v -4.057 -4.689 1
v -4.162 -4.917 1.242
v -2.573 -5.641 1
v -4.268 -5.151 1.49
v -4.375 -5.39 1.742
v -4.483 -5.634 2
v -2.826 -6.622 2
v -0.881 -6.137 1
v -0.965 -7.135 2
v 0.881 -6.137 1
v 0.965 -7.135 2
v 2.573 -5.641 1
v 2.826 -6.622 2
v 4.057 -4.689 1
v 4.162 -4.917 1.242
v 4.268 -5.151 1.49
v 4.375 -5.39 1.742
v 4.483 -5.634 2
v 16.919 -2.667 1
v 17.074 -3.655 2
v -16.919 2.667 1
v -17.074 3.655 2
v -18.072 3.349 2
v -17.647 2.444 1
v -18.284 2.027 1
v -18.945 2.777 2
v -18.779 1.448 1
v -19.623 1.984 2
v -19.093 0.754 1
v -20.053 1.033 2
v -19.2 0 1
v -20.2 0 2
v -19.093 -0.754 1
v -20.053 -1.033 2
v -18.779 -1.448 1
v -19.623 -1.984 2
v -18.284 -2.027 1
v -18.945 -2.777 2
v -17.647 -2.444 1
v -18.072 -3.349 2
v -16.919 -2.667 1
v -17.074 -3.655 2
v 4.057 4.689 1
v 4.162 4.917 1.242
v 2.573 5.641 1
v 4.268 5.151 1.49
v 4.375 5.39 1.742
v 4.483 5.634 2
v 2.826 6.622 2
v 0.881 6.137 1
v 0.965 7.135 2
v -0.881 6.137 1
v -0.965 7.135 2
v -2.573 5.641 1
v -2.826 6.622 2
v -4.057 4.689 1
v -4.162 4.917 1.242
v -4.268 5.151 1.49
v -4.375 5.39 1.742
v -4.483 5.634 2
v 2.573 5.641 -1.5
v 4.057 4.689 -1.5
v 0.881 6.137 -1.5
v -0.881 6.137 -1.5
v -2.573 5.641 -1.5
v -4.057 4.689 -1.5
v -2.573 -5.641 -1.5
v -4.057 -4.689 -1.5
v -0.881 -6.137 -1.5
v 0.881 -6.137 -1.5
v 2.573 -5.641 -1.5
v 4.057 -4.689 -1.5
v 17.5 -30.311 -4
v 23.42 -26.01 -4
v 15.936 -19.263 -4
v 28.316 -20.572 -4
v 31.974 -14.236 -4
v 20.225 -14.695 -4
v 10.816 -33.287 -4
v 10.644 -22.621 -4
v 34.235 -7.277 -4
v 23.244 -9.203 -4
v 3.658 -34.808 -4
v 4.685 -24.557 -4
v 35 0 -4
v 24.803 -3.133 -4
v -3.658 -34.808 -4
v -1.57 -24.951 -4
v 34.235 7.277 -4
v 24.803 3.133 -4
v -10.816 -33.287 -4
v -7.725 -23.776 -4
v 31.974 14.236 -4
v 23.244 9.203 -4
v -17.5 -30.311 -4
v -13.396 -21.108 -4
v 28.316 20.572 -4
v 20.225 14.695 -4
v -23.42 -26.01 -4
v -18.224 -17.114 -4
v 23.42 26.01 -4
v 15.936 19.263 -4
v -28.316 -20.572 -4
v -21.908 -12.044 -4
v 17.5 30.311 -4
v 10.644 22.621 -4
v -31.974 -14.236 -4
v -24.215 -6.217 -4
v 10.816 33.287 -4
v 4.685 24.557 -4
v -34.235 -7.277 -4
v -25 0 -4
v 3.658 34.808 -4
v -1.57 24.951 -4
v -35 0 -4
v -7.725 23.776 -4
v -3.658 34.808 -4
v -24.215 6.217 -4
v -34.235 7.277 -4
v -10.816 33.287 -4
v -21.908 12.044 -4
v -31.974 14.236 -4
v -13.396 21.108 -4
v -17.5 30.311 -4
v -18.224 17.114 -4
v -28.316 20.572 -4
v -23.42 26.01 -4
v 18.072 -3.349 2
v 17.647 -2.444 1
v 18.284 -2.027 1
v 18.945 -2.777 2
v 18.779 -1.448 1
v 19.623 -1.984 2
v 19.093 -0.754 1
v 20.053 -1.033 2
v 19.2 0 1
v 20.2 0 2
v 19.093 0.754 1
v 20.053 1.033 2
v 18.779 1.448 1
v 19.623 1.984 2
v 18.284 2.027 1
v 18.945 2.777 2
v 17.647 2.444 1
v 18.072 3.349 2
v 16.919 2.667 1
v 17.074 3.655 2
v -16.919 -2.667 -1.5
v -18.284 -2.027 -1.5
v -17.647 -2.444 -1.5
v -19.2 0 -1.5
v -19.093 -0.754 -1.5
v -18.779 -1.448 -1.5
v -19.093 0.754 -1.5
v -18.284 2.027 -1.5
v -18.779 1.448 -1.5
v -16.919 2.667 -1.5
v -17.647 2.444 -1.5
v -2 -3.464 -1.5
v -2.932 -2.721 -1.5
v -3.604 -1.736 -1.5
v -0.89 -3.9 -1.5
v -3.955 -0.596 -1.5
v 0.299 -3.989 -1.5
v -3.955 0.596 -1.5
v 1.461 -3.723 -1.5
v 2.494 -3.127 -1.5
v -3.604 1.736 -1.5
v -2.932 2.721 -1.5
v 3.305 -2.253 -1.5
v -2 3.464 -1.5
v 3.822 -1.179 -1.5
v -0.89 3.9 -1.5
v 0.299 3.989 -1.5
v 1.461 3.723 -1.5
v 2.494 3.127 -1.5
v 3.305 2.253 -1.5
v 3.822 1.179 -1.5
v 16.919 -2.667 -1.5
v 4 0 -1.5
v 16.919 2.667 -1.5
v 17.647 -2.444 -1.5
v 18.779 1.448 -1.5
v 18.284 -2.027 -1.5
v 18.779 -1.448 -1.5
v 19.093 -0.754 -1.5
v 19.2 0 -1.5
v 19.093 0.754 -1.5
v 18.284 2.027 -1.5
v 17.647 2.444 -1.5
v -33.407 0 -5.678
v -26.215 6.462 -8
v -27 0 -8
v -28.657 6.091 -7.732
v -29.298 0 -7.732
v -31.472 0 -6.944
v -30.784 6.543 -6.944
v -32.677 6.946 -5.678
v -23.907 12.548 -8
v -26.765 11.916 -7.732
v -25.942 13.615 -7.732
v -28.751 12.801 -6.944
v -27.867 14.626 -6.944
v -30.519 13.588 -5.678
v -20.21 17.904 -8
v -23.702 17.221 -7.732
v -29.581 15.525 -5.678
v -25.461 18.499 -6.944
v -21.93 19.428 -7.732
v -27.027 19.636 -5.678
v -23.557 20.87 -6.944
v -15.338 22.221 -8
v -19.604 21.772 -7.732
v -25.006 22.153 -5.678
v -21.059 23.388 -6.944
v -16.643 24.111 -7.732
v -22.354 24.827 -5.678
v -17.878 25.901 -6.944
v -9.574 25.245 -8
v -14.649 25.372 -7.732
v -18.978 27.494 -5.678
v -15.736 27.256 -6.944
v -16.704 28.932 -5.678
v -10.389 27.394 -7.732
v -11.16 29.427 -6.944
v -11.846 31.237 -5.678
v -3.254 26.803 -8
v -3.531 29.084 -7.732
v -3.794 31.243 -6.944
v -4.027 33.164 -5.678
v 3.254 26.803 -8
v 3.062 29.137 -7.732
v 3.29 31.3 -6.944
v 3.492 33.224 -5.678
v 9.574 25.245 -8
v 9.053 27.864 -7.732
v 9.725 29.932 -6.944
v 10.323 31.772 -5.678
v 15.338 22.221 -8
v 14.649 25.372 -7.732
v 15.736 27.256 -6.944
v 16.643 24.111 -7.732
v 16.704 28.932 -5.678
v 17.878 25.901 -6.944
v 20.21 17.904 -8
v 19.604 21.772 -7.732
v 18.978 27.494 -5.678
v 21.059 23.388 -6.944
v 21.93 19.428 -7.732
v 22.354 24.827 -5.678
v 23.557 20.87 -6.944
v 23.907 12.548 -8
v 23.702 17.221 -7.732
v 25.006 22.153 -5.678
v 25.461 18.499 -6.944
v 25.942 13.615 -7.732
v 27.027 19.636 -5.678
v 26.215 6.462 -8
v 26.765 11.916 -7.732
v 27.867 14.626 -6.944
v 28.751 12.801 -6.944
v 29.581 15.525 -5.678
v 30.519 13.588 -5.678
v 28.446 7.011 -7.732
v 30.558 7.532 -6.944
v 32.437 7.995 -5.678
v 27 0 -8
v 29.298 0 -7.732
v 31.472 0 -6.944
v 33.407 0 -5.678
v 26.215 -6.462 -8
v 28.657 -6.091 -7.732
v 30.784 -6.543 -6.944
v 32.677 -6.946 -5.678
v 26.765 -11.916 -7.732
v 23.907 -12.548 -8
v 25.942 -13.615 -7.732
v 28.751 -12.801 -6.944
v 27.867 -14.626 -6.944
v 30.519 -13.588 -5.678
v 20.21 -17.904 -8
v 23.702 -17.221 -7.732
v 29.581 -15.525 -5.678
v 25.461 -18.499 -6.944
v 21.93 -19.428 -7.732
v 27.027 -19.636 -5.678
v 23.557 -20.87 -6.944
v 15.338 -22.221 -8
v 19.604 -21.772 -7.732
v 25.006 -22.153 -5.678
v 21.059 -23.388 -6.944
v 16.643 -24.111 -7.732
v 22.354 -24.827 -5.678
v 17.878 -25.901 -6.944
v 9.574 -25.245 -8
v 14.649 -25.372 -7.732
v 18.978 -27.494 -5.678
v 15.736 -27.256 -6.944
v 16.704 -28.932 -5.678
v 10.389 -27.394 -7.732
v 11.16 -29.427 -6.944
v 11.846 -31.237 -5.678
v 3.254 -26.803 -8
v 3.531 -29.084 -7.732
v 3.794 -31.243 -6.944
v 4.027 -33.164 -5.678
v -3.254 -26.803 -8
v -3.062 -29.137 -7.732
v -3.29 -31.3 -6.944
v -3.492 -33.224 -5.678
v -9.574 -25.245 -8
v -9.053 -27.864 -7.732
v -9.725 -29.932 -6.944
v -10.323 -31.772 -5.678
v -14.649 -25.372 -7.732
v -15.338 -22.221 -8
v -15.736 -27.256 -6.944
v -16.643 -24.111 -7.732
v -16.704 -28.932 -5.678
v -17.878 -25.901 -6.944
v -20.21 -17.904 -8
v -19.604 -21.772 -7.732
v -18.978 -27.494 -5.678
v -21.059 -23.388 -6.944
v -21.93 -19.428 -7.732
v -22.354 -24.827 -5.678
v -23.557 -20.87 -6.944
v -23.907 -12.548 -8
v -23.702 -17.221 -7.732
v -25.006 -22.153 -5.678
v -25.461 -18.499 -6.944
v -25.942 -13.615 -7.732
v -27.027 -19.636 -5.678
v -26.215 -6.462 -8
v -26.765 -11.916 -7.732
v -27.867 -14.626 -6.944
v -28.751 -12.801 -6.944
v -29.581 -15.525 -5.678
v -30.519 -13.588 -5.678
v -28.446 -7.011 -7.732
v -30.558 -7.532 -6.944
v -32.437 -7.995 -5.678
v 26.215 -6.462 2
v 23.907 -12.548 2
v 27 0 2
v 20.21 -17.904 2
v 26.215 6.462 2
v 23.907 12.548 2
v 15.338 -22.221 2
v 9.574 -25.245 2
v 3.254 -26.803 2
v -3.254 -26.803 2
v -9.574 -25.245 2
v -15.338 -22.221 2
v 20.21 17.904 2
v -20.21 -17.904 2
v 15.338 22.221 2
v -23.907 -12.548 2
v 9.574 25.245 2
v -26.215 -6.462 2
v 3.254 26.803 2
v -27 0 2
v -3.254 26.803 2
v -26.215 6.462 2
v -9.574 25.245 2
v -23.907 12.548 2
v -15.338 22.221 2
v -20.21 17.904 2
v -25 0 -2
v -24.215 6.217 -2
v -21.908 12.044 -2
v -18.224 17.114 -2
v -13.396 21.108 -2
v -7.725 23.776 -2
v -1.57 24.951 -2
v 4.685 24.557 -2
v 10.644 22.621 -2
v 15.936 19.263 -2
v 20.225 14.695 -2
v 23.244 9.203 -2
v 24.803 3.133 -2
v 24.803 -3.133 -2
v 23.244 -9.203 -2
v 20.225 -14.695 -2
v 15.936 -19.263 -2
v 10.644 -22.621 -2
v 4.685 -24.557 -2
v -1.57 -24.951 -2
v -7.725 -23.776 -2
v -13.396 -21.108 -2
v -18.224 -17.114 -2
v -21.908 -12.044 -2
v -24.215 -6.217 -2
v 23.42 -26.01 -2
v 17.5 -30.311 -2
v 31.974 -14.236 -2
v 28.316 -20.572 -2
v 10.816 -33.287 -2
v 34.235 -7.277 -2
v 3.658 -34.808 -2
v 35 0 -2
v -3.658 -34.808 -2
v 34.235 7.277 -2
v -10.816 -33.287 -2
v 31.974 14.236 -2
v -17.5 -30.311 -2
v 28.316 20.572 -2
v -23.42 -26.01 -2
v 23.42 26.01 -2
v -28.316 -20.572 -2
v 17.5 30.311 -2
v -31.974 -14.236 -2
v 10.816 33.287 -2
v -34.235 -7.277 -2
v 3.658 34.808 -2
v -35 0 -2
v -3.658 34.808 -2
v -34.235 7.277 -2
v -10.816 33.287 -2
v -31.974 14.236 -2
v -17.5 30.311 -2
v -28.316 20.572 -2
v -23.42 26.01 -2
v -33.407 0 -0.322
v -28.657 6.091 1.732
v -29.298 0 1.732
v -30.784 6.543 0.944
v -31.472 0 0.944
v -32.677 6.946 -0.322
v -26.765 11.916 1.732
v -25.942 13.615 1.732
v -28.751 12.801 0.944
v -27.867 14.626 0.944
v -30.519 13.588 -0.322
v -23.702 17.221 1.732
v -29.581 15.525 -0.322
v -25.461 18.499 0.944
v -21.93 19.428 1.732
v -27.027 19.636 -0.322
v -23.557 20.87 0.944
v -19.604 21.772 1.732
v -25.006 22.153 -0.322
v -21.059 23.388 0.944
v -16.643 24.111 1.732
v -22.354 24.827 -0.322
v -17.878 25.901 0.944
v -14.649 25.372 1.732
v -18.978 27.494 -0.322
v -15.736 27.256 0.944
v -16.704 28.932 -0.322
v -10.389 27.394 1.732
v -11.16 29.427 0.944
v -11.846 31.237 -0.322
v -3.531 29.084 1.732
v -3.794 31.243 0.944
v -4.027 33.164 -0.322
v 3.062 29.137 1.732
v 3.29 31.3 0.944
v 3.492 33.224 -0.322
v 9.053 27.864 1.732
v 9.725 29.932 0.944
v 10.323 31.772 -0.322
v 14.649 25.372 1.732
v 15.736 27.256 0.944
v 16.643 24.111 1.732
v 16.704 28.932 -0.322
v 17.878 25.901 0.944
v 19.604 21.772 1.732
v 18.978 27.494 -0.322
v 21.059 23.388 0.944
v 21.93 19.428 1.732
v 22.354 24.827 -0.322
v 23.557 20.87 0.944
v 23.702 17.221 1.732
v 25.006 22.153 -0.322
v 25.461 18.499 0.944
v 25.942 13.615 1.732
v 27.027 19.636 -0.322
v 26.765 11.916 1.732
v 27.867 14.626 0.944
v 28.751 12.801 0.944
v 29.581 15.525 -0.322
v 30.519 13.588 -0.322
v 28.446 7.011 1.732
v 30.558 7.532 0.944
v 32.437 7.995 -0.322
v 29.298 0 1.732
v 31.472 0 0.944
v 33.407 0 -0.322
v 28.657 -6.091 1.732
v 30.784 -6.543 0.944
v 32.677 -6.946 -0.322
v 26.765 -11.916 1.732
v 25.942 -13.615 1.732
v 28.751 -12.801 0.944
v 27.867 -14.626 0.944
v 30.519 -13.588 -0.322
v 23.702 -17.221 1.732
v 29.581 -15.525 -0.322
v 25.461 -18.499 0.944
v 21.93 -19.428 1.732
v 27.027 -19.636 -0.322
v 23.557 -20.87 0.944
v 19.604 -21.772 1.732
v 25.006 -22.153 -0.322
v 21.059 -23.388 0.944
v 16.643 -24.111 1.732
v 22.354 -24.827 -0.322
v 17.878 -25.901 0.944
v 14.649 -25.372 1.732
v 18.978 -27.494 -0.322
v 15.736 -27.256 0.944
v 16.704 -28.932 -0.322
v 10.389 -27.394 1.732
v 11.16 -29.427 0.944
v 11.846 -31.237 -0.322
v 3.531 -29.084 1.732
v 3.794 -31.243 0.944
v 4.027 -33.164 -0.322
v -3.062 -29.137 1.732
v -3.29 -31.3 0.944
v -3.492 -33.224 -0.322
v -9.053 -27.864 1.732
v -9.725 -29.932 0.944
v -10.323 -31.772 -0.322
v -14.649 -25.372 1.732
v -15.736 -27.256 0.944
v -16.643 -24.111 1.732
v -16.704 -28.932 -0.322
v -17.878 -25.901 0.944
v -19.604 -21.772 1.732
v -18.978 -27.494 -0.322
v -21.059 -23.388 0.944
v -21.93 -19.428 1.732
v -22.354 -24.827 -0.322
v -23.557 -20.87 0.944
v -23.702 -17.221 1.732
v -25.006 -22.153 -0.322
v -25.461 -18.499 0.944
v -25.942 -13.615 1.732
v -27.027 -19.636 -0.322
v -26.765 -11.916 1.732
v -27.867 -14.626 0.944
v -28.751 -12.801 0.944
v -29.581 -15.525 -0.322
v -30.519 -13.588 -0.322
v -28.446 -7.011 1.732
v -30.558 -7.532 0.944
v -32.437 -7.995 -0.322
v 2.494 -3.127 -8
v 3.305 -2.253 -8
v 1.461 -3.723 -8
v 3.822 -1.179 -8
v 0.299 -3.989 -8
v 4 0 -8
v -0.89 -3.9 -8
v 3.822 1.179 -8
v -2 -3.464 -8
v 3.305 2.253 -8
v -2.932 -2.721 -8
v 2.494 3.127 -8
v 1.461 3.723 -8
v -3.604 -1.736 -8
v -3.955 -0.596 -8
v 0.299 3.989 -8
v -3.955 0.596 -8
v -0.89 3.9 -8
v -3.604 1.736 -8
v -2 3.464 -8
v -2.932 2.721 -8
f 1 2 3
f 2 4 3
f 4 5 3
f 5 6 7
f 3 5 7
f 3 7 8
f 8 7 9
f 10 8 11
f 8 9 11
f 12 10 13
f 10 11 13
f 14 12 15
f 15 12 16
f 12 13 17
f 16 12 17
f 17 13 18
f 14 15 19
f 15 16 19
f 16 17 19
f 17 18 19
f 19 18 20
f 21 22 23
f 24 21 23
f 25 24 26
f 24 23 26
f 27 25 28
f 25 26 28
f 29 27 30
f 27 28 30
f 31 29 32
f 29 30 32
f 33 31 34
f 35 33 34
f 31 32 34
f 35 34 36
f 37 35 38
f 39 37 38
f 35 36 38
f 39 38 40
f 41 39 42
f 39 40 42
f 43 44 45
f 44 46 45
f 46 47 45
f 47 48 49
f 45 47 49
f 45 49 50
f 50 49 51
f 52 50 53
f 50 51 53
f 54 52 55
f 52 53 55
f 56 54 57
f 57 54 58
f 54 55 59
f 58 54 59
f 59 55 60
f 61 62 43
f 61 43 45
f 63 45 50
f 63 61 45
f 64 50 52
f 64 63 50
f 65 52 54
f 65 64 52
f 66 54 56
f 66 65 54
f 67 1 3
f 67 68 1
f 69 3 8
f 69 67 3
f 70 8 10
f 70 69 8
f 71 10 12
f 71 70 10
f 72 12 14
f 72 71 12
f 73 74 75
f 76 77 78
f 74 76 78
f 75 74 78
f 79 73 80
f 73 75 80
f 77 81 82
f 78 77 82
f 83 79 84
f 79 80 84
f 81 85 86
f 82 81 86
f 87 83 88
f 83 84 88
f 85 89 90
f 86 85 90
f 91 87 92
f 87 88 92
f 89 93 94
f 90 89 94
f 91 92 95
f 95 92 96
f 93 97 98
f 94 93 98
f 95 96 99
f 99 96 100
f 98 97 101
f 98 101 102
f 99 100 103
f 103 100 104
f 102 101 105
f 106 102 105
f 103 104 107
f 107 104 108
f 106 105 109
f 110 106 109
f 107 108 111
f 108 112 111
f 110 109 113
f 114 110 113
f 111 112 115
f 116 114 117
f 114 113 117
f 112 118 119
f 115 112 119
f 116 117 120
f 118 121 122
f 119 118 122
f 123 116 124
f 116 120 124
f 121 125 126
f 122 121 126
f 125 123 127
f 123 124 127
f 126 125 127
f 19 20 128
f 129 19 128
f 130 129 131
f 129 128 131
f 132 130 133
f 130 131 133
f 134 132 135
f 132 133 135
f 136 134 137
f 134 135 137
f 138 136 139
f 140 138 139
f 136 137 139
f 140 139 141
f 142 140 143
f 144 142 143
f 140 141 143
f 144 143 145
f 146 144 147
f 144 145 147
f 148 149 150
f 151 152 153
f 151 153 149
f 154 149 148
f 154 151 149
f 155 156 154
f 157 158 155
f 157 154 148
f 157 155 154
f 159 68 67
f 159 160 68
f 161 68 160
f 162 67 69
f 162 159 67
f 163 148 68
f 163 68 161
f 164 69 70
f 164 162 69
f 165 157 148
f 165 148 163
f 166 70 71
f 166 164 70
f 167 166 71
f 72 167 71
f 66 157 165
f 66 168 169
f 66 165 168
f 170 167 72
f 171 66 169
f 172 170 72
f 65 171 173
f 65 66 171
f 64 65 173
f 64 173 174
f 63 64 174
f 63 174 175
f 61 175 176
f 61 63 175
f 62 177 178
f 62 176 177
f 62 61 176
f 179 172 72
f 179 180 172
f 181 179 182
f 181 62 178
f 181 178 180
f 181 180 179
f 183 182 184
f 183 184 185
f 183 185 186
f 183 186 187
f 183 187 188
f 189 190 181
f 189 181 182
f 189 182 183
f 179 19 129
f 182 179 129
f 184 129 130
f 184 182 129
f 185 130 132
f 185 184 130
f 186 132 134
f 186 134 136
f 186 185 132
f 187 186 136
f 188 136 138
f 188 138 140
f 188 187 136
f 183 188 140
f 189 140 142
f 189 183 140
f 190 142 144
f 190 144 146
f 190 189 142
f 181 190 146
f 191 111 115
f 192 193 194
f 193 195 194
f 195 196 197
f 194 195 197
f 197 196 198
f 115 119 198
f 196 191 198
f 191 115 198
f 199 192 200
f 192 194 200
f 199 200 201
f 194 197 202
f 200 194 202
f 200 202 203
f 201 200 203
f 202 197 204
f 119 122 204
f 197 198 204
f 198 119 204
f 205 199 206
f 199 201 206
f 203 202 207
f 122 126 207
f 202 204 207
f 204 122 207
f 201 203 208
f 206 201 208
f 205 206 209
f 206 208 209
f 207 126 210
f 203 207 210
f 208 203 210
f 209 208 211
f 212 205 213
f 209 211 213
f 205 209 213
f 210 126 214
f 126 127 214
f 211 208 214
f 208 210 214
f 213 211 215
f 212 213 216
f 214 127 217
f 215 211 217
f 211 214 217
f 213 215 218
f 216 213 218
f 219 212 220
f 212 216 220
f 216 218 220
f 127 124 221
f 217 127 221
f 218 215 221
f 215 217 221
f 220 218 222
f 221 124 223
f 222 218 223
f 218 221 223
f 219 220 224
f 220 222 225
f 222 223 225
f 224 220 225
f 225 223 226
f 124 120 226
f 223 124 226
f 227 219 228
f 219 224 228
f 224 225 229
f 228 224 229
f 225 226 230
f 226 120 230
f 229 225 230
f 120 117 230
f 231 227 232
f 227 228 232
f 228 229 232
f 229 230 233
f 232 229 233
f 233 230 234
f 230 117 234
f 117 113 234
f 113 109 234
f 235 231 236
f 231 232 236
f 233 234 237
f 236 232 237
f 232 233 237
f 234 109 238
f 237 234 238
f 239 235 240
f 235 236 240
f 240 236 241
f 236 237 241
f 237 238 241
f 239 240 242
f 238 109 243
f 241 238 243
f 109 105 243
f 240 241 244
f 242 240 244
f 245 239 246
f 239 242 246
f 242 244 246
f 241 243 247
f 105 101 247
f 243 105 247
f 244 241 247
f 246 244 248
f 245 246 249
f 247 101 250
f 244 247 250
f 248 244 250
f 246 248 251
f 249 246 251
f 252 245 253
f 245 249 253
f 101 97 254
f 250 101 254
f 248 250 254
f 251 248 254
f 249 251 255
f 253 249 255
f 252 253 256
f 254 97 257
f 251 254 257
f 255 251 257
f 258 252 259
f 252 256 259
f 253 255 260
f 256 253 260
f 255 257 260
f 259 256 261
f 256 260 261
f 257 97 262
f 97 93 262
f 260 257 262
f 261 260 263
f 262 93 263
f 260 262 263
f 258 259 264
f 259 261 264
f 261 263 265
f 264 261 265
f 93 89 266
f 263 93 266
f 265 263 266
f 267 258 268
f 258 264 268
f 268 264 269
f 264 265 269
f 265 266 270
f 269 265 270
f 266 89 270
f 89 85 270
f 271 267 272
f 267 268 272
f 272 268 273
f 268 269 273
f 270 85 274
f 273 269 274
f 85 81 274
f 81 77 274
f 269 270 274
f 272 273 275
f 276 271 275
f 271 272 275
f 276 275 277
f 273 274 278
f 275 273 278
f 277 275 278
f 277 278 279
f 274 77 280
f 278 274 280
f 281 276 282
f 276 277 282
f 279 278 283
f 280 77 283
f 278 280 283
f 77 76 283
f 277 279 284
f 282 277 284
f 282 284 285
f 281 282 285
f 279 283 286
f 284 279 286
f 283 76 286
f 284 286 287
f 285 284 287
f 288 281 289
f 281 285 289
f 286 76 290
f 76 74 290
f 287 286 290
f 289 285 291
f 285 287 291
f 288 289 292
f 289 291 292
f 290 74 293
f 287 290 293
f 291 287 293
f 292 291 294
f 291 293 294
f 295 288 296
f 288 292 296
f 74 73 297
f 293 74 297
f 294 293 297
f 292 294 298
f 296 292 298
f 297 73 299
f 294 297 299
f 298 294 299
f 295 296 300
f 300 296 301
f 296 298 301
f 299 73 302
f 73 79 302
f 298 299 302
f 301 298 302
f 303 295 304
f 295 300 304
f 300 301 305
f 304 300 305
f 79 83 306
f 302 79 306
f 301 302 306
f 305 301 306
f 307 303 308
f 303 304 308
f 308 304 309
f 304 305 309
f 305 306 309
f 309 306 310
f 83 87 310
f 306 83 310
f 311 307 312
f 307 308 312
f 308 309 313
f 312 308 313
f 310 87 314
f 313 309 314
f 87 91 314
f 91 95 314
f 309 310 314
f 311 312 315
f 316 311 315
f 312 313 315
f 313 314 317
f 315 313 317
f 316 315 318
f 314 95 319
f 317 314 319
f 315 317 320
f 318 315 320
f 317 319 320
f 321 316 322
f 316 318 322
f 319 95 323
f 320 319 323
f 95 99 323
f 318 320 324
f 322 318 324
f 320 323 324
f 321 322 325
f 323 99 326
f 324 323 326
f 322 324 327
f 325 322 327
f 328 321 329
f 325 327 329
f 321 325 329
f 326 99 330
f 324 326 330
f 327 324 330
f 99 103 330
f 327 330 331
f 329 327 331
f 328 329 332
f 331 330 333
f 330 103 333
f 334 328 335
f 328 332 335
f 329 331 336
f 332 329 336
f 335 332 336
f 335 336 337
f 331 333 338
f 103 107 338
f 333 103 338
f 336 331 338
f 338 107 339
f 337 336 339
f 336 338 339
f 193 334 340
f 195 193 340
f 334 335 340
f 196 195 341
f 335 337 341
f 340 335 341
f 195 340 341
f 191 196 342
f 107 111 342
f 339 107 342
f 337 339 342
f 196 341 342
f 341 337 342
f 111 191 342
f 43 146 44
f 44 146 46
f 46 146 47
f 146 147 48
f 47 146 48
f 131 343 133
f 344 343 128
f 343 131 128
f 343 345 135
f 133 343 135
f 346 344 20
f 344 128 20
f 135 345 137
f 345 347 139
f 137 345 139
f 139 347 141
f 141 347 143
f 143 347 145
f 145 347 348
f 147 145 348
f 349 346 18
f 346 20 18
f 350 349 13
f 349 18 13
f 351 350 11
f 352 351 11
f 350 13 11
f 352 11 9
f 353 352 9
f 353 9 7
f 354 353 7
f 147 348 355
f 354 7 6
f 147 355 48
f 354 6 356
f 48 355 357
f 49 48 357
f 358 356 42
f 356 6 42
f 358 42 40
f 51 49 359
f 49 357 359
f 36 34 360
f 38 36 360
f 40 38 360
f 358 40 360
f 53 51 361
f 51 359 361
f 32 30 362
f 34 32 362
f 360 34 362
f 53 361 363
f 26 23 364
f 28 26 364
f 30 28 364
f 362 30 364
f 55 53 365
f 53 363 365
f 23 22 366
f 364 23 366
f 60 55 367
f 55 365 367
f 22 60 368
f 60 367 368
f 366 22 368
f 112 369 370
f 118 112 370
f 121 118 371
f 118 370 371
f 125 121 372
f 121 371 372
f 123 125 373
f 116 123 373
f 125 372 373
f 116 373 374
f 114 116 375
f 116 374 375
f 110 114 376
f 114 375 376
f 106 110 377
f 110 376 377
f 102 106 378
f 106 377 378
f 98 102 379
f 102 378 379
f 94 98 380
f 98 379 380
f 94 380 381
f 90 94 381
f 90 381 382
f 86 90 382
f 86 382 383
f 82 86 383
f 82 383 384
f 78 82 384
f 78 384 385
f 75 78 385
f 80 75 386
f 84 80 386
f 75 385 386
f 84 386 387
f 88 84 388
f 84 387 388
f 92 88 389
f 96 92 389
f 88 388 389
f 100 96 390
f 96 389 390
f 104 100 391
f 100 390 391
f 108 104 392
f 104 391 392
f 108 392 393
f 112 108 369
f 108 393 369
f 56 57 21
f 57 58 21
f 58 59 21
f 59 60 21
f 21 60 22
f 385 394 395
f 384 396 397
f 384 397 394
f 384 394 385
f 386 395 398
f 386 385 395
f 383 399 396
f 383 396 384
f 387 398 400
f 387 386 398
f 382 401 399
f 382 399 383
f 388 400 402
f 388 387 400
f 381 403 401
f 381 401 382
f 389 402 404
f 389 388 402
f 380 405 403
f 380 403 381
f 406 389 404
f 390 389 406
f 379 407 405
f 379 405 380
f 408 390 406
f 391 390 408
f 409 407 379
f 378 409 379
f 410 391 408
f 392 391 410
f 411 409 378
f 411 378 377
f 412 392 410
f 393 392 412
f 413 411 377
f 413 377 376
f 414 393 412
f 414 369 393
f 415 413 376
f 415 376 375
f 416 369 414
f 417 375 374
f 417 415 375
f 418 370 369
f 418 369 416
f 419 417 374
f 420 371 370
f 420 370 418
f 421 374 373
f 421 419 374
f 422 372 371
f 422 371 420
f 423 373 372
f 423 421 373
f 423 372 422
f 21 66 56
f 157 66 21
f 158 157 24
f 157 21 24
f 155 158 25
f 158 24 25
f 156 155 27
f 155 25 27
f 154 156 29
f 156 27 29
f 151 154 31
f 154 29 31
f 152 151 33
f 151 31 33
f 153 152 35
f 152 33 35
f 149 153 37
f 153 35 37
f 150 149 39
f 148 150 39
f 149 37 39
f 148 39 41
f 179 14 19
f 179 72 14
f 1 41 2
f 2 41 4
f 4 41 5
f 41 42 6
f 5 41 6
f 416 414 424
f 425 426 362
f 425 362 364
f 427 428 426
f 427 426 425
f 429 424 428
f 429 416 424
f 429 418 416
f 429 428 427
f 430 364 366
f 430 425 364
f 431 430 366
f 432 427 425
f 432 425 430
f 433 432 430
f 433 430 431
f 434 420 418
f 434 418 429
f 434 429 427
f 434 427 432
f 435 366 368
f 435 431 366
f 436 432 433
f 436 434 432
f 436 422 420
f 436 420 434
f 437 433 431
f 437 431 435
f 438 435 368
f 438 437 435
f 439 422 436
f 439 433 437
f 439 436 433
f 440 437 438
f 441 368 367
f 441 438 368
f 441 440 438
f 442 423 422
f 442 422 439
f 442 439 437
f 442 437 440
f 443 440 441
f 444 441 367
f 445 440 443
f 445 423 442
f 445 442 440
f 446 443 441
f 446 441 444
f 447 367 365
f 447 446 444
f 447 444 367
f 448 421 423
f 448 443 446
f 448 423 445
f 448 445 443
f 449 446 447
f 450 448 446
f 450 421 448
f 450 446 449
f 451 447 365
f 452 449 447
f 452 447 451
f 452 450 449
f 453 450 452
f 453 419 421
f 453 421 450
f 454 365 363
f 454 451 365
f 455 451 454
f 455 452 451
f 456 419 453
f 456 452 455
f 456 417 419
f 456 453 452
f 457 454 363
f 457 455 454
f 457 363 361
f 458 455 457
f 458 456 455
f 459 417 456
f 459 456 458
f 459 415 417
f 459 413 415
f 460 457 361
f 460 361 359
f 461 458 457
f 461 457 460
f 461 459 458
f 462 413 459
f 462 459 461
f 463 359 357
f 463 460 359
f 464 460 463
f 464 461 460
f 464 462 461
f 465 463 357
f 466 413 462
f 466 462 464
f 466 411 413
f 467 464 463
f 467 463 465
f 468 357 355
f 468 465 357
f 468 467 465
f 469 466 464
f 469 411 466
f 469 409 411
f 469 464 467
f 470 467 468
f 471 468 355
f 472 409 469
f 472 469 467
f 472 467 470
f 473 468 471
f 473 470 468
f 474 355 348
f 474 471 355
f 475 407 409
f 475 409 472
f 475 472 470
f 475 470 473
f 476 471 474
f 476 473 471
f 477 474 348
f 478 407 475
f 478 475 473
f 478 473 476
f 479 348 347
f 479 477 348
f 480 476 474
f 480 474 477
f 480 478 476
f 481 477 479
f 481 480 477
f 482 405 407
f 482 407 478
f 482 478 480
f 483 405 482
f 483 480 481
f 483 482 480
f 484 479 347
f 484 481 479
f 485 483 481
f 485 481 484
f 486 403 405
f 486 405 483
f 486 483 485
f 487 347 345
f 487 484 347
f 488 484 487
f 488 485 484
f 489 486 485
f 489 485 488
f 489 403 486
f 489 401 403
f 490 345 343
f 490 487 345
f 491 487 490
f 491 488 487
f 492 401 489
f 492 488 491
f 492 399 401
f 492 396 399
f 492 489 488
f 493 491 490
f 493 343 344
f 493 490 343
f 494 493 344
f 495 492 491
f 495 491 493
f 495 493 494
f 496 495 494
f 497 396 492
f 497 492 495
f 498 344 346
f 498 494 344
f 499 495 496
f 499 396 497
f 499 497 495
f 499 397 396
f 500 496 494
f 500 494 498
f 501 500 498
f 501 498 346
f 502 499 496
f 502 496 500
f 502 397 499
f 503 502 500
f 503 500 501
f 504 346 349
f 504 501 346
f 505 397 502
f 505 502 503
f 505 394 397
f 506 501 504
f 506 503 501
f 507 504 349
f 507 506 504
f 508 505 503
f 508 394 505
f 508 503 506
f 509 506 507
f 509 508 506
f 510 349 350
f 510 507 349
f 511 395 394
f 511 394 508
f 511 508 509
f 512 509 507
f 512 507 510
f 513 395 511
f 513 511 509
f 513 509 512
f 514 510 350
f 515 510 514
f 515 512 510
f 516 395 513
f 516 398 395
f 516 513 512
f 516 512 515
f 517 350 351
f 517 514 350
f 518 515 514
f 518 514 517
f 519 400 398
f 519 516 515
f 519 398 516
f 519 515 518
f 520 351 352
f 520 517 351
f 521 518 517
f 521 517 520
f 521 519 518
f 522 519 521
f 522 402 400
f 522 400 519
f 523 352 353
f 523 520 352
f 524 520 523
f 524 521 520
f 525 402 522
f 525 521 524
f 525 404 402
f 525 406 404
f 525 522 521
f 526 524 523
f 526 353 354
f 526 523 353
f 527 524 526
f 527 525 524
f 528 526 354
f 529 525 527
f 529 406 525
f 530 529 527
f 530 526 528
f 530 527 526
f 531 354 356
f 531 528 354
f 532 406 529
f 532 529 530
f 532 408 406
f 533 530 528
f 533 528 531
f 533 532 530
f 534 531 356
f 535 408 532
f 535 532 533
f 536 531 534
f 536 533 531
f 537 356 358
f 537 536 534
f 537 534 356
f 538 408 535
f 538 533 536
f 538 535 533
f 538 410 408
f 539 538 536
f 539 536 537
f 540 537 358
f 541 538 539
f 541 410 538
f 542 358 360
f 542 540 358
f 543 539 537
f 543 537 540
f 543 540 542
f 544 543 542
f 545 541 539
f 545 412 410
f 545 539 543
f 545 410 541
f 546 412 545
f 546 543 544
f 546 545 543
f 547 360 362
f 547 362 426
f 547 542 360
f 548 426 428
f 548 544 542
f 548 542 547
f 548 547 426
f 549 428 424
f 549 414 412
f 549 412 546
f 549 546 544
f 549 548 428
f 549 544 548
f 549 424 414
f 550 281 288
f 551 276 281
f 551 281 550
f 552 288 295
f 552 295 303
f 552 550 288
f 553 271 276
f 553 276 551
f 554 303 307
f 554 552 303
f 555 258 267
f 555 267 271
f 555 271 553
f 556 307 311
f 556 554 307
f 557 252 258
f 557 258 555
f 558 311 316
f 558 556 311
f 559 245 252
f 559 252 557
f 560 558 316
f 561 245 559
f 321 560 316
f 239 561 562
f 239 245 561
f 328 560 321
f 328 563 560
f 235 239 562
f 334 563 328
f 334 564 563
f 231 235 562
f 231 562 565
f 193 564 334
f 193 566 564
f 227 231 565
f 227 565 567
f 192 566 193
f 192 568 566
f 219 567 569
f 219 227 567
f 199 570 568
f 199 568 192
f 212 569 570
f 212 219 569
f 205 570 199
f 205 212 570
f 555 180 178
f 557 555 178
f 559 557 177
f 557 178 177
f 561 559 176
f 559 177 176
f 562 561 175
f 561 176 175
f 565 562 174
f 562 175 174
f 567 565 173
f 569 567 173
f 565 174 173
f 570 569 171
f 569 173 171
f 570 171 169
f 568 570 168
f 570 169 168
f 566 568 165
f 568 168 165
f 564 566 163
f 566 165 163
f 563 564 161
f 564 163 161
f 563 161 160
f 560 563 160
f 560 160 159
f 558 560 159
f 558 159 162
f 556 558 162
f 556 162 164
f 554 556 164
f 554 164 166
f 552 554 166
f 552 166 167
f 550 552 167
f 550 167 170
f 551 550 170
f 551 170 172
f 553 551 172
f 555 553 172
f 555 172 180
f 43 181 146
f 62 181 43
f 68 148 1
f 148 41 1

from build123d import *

# Parameters (mm, degrees)
SKETCH_1_R               = 1.5
EXTRUDE_1_DEPTH          = 2.3
SKETCH_2_R               = 4.4
EXTRUDE_2_DEPTH          = 3.2
SKETCH_3_R               = 4.4
SKETCH_3_R_2             = 3.4
SKETCH_3_R_3             = 2.75
SKETCH_3_R_4             = 1.5
CUT_EXTRUDE_1_DEPTH      = 1
BOSS_EXTRUDE1_DEPTH      = 2
BOSS_EXTRUDE1_DEPTH_BACK = 2
SKETCH1_R                = 35
INTERSECT2_OUTLINE_R     = 4.4
INTERSECT2_OUTLINE_R_2   = 3.4
INTERSECT2_OUTLINE_R_3   = 2.75
INTERSECT2_DEPTH         = 5.5
INTERSECT2_START         = 1
INTERSECT2_2_OUTLINE_R   = 4.4
INTERSECT2_2_OUTLINE_R_2 = 3.4
INTERSECT2_2_OUTLINE_R_3 = 2.75
INTERSECT2_2_OUTLINE_R_4 = 1.5
INTERSECT2_2_DEPTH       = 4.5
FILLET1_R                = 10
SKETCH2_R                = 25
BOSS_EXTRUDE2_DEPTH      = 2
SKETCH3_R                = 27
BOSS_EXTRUDE3_DEPTH      = 2
SKETCH4_R                = 6
CUT_EXTRUDE1_DEPTH       = 2
CUT_EXTRUDE3_REACH       = 52.14
SKETCH5_R                = 4
CUT_EXTRUDE4_START       = -2
CUT_EXTRUDE4_DEPTH       = 2
CHAMFER1_SIZE            = 1
CUT_EXTRUDE5_DEPTH       = 1.5


# Read off the part's stored shape, not the designer's step: Intersect2
with BuildPart() as part:
    # Эскиз1 → Бобышка-Вытянуть1 (new body)
    with BuildSketch(Plane.XY):
        with BuildLine():
            Line((-3.968626967, 4.5), (-16.888114198, 2.469689731))
            ThreePointArc((-16.888114198, 2.469689731), (-19, 0), (-16.888114198, -2.469689731))
            Line((-16.888114198, -2.469689731), (-3.968626967, -4.5))
            ThreePointArc((-3.968626967, -4.5), (0, -6), (3.968626967, -4.5))
            Line((3.968626967, -4.5), (16.888114198, -2.469689731))
            ThreePointArc((16.888114198, -2.469689731), (19, 0), (16.888114198, 2.469689731))
            Line((16.888114198, 2.469689731), (3.968626967, 4.5))
            ThreePointArc((3.968626967, 4.5), (0, 6), (-3.968626967, 4.5))
        make_face()
        Circle(SKETCH_1_R, mode=Mode.SUBTRACT)
    extrude(amount=EXTRUDE_1_DEPTH)

    # Эскиз2 → Бобышка-Вытянуть2 (add)
    with BuildSketch(Plane.XY.offset(2.3)):
        with Locations(Location((0, 0, 0), (0, 0, 180))):
            Circle(SKETCH_2_R)
        Polygon((0.333439775, 2.639447604), (0, 3.05), (-0.333439775, 2.639447604), (-0.758504156, 2.954178641), (-0.979368078, 2.473601404), (-1.469348706, 2.672735374), (-1.563759083, 2.15232973), (-2.087868673, 2.223354314), (-2.049893354, 1.695819264), (-2.575200173, 1.634271725), (-2.407225286, 1.132754236), (-2.900722375, 0.942501833), (-2.6133024, 0.498514094), (-3.043981522, 0.191511085), (-2.655176114, -0.167049522), (-2.995976115, -0.571513009), (-2.530215347, -0.822116802), (-2.75972251, -1.298626839), (-2.246271844, -1.42552746), (-2.35006539, -1.944143169), (-1.821186821, -1.939366985), (-1.792745019, -2.467501833), (-1.281669931, -2.33134895), (-1.122779886, -2.835818282), (-0.661621006, -2.576843686), (-0.382266362, -3.025949839), (0, -2.660425857), (0.382266362, -3.025949839), (0.661621006, -2.576843686), (1.122779886, -2.835818282), (1.281669931, -2.33134895), (1.792745019, -2.467501833), (1.821186821, -1.939366985), (2.35006539, -1.944143169), (2.246271844, -1.42552746), (2.75972251, -1.298626839), (2.530215347, -0.822116802), (2.995976115, -0.571513009), (2.655176114, -0.167049522), (3.043981522, 0.191511085), (2.6133024, 0.498514094), (2.900722375, 0.942501833), (2.407225286, 1.132754236), (2.575200173, 1.634271725), (2.049893354, 1.695819264), (2.087868673, 2.223354314), (1.563759083, 2.15232973), (1.469348706, 2.672735374), (0.979368078, 2.473601404), (0.758504156, 2.954178641), align=None, mode=Mode.SUBTRACT)
    extrude(amount=EXTRUDE_2_DEPTH)

    # Эскиз3 → Вырез-Вытянуть1 (cut)
    # profile 1 of 2: a face of its own
    with BuildSketch(Plane(origin=(0, 0, 0), x_dir=(-1, 0, 0), z_dir=(0, 0, -1))):
        Circle(SKETCH_3_R)
        Circle(SKETCH_3_R_2, mode=Mode.SUBTRACT)
    # profile 2 of 2: a face of its own
    with BuildSketch(Plane(origin=(0, 0, 0), x_dir=(-1, 0, 0), z_dir=(0, 0, -1))):
        Circle(SKETCH_3_R_3)
        Circle(SKETCH_3_R_4, mode=Mode.SUBTRACT)
    extrude(amount=-CUT_EXTRUDE_1_DEPTH, mode=Mode.SUBTRACT)


with BuildPart() as body_2:
    # Sketch1 → Boss-Extrude1 (new, two sides: drawn at the far end of the back side and taken through both)
    with BuildSketch(Plane(origin=(0, 0, 0), x_dir=(-1, 0, 0), z_dir=(0, 0, -1)).offset(-BOSS_EXTRUDE1_DEPTH_BACK)):
        Circle(SKETCH1_R)
    extrude(amount=BOSS_EXTRUDE1_DEPTH + BOSS_EXTRUDE1_DEPTH_BACK)


with BuildPart() as intersect2_tool:
    # Intersect2 outline → Intersect2 (new body)
    # profile 1 of 2: a face of its own
    with BuildSketch(Plane.XY):
        with BuildLine():
            ThreePointArc((3.968626967, 4.5), (0, 6), (-3.968626967, 4.5))
            Line((-3.968626967, 4.5), (-16.888114198, 2.469689731))
            ThreePointArc((-16.888114198, 2.469689731), (-19, 0), (-16.888114198, -2.469689731))
            Line((-16.888114198, -2.469689731), (-3.968626967, -4.5))
            ThreePointArc((-3.968626967, -4.5), (0, -6), (3.968626967, -4.5))
            Line((3.968626967, -4.5), (16.888114198, -2.469689731))
            ThreePointArc((16.888114198, -2.469689731), (19, 0), (16.888114198, 2.469689731))
            Line((16.888114198, 2.469689731), (3.968626967, 4.5))
        make_face()
        Circle(INTERSECT2_OUTLINE_R, mode=Mode.SUBTRACT)
    # profile 2 of 2: a face of its own
    with BuildSketch(Plane.XY):
        Circle(INTERSECT2_OUTLINE_R_2)
        Circle(INTERSECT2_OUTLINE_R_3, mode=Mode.SUBTRACT)
    extrude(amount=INTERSECT2_DEPTH)


with BuildPart() as part_1:
    add(part.part)

    # Intersect2: cut by intersect2_tool
    add(intersect2_tool.part, mode=Mode.SUBTRACT)


with BuildPart() as body_2_1:
    add(body_2.part)

    # Intersect2: cut by intersect2_tool
    add(intersect2_tool.part, mode=Mode.SUBTRACT)


with BuildPart() as intersect2_2_tool:
    # Intersect2 2 outline → Intersect2 2 (new body)
    # profile 1 of 2: a face of its own
    with BuildSketch(Plane.XY.offset(INTERSECT2_START)):
        Circle(INTERSECT2_2_OUTLINE_R)
        Circle(INTERSECT2_2_OUTLINE_R_2, mode=Mode.SUBTRACT)
    # profile 2 of 2: a face of its own
    with BuildSketch(Plane.XY.offset(INTERSECT2_START)):
        Circle(INTERSECT2_2_OUTLINE_R_3)
        Circle(INTERSECT2_2_OUTLINE_R_4, mode=Mode.SUBTRACT)
    extrude(amount=INTERSECT2_2_DEPTH)


with BuildPart() as part_2:
    add(part_1.part)

    # Intersect2 2: cut by intersect2_2_tool
    add(intersect2_2_tool.part, mode=Mode.SUBTRACT)


with BuildPart() as body_2_2:
    add(body_2_1.part)

    # Intersect2 2: cut by intersect2_2_tool
    add(intersect2_2_tool.part, mode=Mode.SUBTRACT)

    # Fillet1
    # the kernel refuses this fillet: 10 mm, written as the material it takes off along each edge
    with BuildSketch(Plane(origin=(0, 0, 2), x_dir=(-1, 0, 0), z_dir=(0, -1, 0))) as fillet1_piece_1:
        with BuildLine():
            CenterArc((27, 10), FILLET1_R, 270, 53.130102354)
            Line((27, 0), (27, -0.2))
            Line((27, -0.2), (35, -0.2))
            Line((35, -0.2), (35.2, 0))
            ThreePointArc((35.2, 0), (35.2, 2), (35.16, 3.88))
            Line((35.16, 3.88), (35, 4))
        make_face()
    revolve(axis=Axis((0, 0, 2), (0, 0, -1)), mode=Mode.SUBTRACT)


with BuildPart() as body_2_2_1:
    # Mirror9: mirrored copy
    add(body_2_2.part.mirror(Plane.XY.offset(-3)))


with BuildPart() as body_2_3:
    add(body_2_2.part)

    add(body_2_2_1.part)  # Boss-Extrude2 merges body 2 2
    # Sketch2 → Boss-Extrude2 (add)
    with BuildSketch(Plane(origin=(0, 0, -2), x_dir=(-1, 0, 0), z_dir=(0, 0, -1))):
        Circle(SKETCH2_R)
    extrude(amount=BOSS_EXTRUDE2_DEPTH)

    # Sketch3 → Boss-Extrude3 (add)
    with BuildSketch(Plane(origin=(0, 0, -8), x_dir=(-1, 0, 0), z_dir=(0, 0, -1))):
        Circle(SKETCH3_R)
    extrude(amount=-BOSS_EXTRUDE3_DEPTH)

    # Sketch4 → Cut-Extrude1 (cut)
    with BuildSketch(Plane.XY):
        Circle(SKETCH4_R)
    extrude(amount=CUT_EXTRUDE1_DEPTH, mode=Mode.SUBTRACT)

    # Sketch5 → Cut-Extrude3 (cut, up to next)
    with BuildSketch(Plane.XY, mode=Mode.PRIVATE) as cut_extrude3_sk1:
        Circle(SKETCH5_R)
    cut_extrude3_tool1 = extrude(cut_extrude3_sk1.sketch, amount=-CUT_EXTRUDE3_REACH, mode=Mode.PRIVATE) & body_2_3.part
    add(cut_extrude3_tool1.solids().sort_by_distance((0, 0, 0))[0], mode=Mode.SUBTRACT)

    # Sketch6 → Cut-Extrude4 (cut)
    with BuildSketch(Plane.XY.offset(2).offset(CUT_EXTRUDE4_START)):
        with BuildLine():
            Line((16.919163334, 2.66726491), (4.056712891, 4.68861179))
            ThreePointArc((4.056712891, 4.68861179), (0, 6.2), (-4.056712891, 4.68861179))
            Line((-4.056712891, 4.68861179), (-16.919163334, 2.66726491))
            ThreePointArc((-16.919163334, 2.66726491), (-19.2, 0), (-16.919163334, -2.66726491))
            Line((-16.919163334, -2.66726491), (-4.056712891, -4.68861179))
            ThreePointArc((-4.056712891, -4.68861179), (0, -6.2), (4.056712891, -4.68861179))
            Line((4.056712891, -4.68861179), (16.919163334, -2.66726491))
            ThreePointArc((16.919163334, -2.66726491), (19.2, 0), (16.919163334, 2.66726491))
        make_face()
    extrude(amount=CUT_EXTRUDE4_DEPTH, mode=Mode.SUBTRACT)

    # Chamfer1
    chamfer1_edges = [body_2_3.edges().sort_by_distance(p)[0] for p in [
        (0, 6.2, 2),
        (-10.487938112, 3.67793835, 2),
        (-19.2, 0, 2),
        (-10.487938112, -3.67793835, 2),
        (0, -6.2, 2),
        (10.487938112, -3.67793835, 2),
        (19.2, 0, 2),
        (10.487938112, 3.67793835, 2),
    ]]
    chamfer(chamfer1_edges, length=CHAMFER1_SIZE)

    # Sketch8 → Cut-Extrude5 (cut)
    with BuildSketch(Plane.XY):
        with BuildLine():
            Line((-4.056712891, 4.68861179), (-16.919163334, 2.66726491))
            ThreePointArc((-16.919163334, 2.66726491), (-19.2, 0), (-16.919163334, -2.66726491))
            Line((-16.919163334, -2.66726491), (-4.056712891, -4.68861179))
            ThreePointArc((-4.056712891, -4.68861179), (0, -6.2), (4.056712891, -4.68861179))
            Line((4.056712891, -4.68861179), (16.919163334, -2.66726491))
            ThreePointArc((16.919163334, -2.66726491), (19.2, 0), (16.919163334, 2.66726491))
            Line((16.919163334, 2.66726491), (4.056712891, 4.68861179))
            ThreePointArc((4.056712891, 4.68861179), (0, 6.2), (-4.056712891, 4.68861179))
        make_face()
    extrude(amount=-CUT_EXTRUDE5_DEPTH, mode=Mode.SUBTRACT)


solid = body_2_3.part
